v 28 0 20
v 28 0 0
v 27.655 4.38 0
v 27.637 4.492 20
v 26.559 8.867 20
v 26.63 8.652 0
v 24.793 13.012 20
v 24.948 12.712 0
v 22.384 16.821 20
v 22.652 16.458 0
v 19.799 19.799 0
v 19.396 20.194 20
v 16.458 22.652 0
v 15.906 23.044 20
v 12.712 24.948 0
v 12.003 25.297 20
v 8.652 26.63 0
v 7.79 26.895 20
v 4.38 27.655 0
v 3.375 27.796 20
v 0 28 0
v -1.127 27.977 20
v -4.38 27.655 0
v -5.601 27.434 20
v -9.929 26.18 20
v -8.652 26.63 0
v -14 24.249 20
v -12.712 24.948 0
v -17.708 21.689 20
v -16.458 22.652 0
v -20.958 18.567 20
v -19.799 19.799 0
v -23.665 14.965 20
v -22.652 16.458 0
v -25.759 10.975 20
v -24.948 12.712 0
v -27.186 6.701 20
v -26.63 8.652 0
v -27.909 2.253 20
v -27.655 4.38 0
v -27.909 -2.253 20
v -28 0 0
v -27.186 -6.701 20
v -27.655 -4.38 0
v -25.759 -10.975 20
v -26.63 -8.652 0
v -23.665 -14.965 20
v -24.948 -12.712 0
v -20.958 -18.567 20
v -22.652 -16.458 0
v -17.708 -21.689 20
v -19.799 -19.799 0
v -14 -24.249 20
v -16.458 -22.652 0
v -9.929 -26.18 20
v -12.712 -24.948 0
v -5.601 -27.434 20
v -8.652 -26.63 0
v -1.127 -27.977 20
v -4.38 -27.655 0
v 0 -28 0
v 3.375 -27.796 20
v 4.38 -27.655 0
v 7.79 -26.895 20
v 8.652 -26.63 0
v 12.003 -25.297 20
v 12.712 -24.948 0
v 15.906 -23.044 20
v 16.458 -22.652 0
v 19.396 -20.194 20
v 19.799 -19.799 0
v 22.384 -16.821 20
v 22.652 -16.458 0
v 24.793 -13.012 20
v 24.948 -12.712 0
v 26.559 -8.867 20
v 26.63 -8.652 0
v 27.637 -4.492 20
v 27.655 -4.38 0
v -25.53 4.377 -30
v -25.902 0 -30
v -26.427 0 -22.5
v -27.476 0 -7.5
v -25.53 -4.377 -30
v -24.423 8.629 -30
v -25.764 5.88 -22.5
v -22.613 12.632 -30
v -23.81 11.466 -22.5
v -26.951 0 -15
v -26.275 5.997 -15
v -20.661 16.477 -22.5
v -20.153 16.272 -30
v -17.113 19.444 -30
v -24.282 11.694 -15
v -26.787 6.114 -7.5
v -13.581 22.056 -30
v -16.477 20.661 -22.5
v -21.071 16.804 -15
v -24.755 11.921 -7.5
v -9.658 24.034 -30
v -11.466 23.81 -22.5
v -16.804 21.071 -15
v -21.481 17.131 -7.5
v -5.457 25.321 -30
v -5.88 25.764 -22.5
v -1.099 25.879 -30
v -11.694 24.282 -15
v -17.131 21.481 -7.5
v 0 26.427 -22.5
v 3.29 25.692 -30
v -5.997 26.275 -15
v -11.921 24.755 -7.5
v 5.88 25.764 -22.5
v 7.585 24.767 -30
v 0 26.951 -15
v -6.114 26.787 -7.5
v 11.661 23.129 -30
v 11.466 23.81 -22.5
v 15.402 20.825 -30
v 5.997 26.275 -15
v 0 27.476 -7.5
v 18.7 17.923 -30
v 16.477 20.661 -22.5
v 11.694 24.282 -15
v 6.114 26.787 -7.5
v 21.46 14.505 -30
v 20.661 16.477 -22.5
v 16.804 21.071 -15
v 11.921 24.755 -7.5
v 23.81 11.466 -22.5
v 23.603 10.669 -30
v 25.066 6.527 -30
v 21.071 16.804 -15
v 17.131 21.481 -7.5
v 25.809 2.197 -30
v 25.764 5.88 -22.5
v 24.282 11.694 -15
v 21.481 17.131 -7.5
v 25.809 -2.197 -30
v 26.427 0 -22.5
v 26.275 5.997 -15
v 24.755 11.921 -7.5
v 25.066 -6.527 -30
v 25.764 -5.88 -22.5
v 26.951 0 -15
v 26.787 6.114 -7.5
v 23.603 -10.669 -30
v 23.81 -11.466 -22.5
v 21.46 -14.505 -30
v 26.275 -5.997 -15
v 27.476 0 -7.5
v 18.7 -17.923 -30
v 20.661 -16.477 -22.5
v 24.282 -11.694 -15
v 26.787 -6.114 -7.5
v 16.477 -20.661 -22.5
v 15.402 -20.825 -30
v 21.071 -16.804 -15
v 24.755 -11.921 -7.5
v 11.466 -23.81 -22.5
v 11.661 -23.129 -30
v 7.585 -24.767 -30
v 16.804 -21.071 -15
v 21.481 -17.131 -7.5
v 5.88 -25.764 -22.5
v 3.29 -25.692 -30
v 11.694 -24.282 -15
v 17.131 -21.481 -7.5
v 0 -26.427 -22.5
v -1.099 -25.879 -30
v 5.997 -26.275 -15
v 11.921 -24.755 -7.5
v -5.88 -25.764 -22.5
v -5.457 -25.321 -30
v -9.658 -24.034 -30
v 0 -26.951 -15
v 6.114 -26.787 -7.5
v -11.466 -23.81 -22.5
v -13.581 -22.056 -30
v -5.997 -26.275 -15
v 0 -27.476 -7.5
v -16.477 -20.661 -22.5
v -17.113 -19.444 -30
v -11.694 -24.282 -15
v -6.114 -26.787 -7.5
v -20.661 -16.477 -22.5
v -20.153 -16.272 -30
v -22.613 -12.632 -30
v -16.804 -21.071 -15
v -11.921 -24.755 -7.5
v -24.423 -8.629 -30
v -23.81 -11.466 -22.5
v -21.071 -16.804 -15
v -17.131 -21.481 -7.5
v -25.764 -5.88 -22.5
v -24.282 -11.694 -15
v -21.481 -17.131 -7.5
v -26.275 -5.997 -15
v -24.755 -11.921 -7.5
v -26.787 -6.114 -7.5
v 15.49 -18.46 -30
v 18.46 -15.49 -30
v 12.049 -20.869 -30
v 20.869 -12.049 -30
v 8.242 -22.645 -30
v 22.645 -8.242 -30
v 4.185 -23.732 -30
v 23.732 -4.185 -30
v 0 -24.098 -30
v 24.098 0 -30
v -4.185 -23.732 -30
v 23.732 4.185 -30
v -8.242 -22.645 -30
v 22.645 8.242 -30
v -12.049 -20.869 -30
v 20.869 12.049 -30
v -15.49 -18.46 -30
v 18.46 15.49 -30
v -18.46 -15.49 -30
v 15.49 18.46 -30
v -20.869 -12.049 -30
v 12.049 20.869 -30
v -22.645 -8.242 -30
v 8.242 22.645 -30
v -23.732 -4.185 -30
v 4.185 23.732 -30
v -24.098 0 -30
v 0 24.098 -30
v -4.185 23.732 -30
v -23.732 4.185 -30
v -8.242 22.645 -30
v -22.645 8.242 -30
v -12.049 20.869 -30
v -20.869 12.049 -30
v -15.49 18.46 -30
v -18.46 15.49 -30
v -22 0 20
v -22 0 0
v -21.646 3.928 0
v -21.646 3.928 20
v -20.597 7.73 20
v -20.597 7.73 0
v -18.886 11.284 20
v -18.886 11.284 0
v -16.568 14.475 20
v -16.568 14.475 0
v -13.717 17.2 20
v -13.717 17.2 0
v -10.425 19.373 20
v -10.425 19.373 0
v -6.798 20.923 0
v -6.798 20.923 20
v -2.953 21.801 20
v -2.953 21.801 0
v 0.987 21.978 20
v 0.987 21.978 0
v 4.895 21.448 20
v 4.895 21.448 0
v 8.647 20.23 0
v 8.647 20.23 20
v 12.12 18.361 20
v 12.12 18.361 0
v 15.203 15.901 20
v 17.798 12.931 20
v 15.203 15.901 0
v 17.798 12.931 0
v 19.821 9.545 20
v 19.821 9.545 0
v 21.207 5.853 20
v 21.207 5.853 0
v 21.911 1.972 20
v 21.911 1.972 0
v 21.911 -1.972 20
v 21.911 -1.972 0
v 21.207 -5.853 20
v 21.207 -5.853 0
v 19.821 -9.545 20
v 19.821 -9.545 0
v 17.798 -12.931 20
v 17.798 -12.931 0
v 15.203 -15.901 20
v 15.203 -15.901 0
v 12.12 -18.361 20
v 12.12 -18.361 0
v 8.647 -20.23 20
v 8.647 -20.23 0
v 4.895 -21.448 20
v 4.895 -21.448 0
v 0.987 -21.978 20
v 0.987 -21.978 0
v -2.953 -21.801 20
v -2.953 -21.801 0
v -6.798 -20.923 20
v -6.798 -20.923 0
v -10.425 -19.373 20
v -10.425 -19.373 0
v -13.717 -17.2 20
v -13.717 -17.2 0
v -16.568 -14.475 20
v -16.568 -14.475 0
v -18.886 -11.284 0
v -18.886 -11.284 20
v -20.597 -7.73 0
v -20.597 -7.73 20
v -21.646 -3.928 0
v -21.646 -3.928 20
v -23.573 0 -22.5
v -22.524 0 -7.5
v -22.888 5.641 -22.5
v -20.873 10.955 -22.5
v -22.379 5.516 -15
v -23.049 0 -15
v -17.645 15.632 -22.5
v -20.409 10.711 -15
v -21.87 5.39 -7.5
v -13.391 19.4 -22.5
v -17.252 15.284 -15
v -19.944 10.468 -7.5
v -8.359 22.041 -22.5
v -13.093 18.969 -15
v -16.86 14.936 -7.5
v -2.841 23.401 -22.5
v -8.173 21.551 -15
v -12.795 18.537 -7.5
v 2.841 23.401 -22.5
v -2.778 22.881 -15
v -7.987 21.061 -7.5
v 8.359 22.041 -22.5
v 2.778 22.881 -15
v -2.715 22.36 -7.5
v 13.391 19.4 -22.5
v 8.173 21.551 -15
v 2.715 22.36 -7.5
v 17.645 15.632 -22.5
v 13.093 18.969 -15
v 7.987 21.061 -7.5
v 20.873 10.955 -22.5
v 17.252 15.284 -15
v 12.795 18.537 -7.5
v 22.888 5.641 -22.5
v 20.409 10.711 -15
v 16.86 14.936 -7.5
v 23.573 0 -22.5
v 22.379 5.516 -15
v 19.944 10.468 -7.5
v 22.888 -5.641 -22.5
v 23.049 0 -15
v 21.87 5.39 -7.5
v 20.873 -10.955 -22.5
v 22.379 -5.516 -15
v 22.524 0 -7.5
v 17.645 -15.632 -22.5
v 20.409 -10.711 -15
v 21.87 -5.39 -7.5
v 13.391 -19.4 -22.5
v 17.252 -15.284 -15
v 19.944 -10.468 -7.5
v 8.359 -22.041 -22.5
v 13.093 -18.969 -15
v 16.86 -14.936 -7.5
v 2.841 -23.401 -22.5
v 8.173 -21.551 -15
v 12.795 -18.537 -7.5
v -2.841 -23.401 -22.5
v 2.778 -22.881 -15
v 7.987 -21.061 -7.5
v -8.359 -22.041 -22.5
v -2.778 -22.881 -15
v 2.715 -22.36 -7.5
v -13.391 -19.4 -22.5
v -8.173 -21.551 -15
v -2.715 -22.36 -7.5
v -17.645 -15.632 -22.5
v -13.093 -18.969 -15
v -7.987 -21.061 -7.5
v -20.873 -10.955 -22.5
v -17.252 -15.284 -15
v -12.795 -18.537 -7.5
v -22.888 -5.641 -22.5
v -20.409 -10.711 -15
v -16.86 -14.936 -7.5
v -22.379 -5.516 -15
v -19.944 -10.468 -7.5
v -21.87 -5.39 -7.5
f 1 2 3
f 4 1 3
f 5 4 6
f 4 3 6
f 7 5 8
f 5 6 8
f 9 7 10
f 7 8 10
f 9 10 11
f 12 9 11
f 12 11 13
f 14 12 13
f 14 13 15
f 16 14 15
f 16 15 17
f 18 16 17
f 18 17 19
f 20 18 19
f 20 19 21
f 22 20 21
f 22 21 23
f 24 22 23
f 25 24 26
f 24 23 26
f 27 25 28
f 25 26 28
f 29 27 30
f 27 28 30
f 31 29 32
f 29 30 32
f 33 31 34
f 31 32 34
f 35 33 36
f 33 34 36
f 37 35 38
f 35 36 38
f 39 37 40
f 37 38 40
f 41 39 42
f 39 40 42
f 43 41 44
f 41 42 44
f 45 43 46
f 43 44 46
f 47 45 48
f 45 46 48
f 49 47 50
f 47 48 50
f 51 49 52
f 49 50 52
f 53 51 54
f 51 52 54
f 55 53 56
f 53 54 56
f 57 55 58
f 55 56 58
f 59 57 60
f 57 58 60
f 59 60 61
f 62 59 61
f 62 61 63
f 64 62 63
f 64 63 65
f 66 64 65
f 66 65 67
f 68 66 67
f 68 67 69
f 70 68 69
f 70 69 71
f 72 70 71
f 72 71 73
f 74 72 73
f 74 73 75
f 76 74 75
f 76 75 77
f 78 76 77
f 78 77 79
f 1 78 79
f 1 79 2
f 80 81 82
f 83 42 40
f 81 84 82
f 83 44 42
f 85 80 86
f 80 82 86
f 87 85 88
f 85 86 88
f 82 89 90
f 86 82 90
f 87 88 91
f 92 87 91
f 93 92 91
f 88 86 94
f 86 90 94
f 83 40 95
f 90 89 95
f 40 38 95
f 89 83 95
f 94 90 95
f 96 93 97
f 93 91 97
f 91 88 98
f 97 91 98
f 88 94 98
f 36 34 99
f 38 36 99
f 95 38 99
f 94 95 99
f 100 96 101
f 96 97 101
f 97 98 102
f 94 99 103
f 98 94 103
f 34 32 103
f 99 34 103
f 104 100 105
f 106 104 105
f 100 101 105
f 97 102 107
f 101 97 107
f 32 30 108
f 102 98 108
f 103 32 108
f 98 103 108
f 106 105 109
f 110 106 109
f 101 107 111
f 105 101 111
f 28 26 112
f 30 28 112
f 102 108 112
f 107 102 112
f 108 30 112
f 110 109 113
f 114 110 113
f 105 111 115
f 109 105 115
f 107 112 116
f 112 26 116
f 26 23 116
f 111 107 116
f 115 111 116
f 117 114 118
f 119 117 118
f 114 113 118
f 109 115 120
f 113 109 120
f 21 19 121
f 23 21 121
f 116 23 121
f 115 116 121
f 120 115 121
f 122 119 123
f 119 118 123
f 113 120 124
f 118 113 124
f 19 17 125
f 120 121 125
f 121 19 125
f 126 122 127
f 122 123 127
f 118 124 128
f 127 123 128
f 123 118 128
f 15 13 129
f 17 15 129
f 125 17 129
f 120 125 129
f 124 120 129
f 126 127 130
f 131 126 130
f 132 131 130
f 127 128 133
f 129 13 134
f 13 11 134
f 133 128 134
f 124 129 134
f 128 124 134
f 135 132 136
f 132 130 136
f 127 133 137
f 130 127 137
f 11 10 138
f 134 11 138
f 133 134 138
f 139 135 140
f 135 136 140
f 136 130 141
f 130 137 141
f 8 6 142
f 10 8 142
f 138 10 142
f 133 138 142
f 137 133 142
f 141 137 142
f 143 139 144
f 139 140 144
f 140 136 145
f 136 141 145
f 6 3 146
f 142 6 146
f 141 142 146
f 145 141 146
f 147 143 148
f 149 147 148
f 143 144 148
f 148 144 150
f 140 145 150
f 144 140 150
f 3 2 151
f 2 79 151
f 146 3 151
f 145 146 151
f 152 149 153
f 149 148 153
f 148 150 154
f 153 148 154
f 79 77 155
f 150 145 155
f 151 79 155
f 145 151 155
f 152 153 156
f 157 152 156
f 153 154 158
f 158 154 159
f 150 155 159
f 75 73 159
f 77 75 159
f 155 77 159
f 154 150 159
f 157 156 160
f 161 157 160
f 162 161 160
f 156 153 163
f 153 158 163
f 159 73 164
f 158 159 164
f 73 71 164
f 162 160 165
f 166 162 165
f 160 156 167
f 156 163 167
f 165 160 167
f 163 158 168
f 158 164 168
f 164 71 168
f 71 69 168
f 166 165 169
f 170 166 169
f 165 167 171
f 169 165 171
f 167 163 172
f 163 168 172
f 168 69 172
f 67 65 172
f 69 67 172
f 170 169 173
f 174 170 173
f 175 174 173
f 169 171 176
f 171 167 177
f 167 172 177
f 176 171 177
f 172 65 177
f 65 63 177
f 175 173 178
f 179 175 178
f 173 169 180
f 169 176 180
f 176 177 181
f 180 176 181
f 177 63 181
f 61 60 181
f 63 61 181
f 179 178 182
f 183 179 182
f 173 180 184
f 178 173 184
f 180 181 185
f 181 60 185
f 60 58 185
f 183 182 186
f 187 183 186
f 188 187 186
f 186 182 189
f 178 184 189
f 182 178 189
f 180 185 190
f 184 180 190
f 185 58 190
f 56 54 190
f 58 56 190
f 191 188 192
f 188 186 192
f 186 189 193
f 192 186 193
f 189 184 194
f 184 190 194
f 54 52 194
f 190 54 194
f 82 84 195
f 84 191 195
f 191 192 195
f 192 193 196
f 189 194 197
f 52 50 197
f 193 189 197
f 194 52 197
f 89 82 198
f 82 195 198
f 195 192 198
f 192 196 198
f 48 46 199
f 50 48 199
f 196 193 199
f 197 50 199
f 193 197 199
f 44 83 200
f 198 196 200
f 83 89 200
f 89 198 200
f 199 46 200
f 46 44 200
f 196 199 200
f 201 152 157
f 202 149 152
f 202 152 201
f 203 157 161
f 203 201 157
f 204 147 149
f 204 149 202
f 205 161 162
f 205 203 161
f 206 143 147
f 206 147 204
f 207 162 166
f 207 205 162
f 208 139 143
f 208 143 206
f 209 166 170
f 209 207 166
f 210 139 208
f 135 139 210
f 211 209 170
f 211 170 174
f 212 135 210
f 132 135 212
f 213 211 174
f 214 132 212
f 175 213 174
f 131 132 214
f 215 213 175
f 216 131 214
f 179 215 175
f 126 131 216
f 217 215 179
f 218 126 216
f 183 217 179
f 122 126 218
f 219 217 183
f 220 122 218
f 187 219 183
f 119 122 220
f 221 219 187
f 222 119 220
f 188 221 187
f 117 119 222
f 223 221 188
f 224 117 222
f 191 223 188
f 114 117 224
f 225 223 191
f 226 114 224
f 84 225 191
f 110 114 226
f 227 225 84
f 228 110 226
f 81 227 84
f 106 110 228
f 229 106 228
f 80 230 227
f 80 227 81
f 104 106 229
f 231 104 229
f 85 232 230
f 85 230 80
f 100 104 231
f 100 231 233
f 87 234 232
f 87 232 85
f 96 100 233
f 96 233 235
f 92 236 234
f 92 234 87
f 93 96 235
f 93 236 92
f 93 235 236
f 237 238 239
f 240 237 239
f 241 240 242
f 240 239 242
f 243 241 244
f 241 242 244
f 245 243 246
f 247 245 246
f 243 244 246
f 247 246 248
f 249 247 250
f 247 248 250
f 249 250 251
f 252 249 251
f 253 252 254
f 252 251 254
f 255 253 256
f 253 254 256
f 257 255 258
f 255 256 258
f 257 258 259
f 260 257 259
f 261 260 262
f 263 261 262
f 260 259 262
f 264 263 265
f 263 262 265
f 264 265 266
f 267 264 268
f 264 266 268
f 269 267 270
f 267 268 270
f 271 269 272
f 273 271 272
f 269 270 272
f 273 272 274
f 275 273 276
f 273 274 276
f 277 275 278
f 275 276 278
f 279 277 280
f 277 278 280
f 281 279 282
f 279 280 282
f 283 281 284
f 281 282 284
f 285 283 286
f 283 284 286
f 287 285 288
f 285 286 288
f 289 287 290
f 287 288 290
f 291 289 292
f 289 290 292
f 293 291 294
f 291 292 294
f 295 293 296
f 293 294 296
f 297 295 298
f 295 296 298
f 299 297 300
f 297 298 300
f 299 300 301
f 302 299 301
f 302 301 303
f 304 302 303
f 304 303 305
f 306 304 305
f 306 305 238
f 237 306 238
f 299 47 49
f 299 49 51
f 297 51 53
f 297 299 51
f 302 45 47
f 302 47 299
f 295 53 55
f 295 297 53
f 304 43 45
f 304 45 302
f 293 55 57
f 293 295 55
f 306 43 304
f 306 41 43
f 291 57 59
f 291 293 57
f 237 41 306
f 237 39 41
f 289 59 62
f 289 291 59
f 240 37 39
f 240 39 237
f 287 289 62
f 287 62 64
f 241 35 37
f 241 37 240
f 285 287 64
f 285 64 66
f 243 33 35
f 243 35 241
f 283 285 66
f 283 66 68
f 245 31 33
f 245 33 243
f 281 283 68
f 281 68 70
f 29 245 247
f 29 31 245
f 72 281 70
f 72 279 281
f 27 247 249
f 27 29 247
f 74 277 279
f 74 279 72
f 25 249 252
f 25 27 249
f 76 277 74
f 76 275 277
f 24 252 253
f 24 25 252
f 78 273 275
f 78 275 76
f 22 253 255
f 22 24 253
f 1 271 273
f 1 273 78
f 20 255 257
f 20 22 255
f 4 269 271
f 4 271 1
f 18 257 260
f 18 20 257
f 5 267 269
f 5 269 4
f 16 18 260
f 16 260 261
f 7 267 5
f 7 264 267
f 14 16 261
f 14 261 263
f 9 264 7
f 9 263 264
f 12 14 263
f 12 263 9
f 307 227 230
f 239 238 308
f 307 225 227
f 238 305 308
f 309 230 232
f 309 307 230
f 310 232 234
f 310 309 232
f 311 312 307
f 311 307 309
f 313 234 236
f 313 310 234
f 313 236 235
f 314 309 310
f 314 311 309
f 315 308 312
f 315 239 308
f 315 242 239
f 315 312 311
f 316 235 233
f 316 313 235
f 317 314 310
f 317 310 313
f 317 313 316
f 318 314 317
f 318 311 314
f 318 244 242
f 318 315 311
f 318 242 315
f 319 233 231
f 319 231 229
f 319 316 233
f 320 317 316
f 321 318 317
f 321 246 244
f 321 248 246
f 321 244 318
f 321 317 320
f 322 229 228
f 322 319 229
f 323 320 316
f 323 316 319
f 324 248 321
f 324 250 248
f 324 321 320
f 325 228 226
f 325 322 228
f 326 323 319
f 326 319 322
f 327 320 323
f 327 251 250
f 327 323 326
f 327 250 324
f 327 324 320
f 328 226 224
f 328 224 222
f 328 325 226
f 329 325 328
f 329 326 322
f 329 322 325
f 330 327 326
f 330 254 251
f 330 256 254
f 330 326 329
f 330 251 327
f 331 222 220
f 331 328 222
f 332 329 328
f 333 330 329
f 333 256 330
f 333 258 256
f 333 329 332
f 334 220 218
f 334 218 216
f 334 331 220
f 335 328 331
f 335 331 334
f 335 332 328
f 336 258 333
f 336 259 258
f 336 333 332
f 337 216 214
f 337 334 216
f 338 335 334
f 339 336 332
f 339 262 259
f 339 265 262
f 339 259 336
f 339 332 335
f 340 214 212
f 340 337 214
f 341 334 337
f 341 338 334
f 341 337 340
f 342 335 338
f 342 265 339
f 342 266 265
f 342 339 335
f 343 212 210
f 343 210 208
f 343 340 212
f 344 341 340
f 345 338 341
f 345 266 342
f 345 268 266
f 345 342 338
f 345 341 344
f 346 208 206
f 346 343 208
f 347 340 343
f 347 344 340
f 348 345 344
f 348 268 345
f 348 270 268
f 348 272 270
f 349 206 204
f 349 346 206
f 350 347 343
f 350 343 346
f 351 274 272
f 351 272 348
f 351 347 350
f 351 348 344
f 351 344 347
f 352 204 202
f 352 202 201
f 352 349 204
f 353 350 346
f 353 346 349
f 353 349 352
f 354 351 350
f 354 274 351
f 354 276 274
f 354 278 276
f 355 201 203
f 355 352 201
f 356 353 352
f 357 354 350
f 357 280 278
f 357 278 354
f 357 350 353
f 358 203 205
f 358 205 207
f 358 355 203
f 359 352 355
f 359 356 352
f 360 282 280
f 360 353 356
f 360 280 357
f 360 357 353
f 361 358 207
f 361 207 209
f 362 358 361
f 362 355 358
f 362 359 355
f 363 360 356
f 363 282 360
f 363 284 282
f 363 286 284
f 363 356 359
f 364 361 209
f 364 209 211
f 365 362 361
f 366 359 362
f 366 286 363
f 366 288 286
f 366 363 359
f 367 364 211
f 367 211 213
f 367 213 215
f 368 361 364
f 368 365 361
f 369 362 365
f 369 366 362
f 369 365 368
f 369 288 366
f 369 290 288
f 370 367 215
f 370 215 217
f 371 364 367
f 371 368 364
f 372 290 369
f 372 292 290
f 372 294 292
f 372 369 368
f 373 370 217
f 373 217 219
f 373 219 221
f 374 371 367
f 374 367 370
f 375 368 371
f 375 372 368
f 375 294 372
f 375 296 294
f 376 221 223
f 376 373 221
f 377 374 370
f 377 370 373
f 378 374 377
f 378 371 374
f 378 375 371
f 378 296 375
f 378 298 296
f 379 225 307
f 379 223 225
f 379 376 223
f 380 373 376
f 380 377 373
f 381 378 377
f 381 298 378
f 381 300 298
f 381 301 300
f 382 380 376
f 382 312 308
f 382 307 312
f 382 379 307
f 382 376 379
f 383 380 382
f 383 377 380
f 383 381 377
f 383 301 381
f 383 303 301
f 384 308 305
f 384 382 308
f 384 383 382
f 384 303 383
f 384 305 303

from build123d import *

# Parameters (mm, degrees)
ESQUISSE1_R             = 28
BOSS_EXTRU_1_DEPTH      = 20
ESQUISSE2_R             = 22
ENL_V_MAT_EXTRU_1_DEPTH = 20
ESQUISSE3_R             = 28
ESQUISSE3_R_2           = 22
BOSS_EXTRU_2_DEPTH      = 30
BOSS_EXTRU_2_DRAFT      = 4


with BuildPart() as part:
    # Esquisse1 → Boss.-Extru.1 (new body)
    with BuildSketch(Plane.XY):
        Circle(ESQUISSE1_R)
    extrude(amount=BOSS_EXTRU_1_DEPTH)

    # Esquisse2 → Enlèv. mat.-Extru.1 (cut)
    with BuildSketch(Plane(origin=(0, 0, 0), x_dir=(-1, 0, 0), z_dir=(0, 0, -1))):
        Circle(ESQUISSE2_R)
    extrude(amount=-ENL_V_MAT_EXTRU_1_DEPTH, mode=Mode.SUBTRACT)


with BuildPart() as boss_extru_2_tool:
    # Esquisse3 → Boss.-Extru.2 (with draft: the straight prism first)
    with BuildSketch(Plane(origin=(0, 0, 0), x_dir=(-1, 0, 0), z_dir=(0, 0, -1))):
        Circle(ESQUISSE3_R)
        Circle(ESQUISSE3_R_2, mode=Mode.SUBTRACT)
    extrude(amount=BOSS_EXTRU_2_DEPTH)
    # Boss.-Extru.2: the draft: its side faces are tilted about the plane it starts from
    boss_extru_2_sides = [boss_extru_2_tool.faces().sort_by_distance(p)[0] for p in [
        (28, 0, -15),
        (22, 0, -15),
    ]]
    draft(boss_extru_2_sides, Plane(origin=(0, 0, 0), x_dir=(-1, 0, 0), z_dir=(0, 0, -1)), BOSS_EXTRU_2_DRAFT)


with BuildPart() as part_1:
    add(part.part)

    # Boss.-Extru.2: add boss_extru_2_tool
    add(boss_extru_2_tool.part)


solid = part_1.part
